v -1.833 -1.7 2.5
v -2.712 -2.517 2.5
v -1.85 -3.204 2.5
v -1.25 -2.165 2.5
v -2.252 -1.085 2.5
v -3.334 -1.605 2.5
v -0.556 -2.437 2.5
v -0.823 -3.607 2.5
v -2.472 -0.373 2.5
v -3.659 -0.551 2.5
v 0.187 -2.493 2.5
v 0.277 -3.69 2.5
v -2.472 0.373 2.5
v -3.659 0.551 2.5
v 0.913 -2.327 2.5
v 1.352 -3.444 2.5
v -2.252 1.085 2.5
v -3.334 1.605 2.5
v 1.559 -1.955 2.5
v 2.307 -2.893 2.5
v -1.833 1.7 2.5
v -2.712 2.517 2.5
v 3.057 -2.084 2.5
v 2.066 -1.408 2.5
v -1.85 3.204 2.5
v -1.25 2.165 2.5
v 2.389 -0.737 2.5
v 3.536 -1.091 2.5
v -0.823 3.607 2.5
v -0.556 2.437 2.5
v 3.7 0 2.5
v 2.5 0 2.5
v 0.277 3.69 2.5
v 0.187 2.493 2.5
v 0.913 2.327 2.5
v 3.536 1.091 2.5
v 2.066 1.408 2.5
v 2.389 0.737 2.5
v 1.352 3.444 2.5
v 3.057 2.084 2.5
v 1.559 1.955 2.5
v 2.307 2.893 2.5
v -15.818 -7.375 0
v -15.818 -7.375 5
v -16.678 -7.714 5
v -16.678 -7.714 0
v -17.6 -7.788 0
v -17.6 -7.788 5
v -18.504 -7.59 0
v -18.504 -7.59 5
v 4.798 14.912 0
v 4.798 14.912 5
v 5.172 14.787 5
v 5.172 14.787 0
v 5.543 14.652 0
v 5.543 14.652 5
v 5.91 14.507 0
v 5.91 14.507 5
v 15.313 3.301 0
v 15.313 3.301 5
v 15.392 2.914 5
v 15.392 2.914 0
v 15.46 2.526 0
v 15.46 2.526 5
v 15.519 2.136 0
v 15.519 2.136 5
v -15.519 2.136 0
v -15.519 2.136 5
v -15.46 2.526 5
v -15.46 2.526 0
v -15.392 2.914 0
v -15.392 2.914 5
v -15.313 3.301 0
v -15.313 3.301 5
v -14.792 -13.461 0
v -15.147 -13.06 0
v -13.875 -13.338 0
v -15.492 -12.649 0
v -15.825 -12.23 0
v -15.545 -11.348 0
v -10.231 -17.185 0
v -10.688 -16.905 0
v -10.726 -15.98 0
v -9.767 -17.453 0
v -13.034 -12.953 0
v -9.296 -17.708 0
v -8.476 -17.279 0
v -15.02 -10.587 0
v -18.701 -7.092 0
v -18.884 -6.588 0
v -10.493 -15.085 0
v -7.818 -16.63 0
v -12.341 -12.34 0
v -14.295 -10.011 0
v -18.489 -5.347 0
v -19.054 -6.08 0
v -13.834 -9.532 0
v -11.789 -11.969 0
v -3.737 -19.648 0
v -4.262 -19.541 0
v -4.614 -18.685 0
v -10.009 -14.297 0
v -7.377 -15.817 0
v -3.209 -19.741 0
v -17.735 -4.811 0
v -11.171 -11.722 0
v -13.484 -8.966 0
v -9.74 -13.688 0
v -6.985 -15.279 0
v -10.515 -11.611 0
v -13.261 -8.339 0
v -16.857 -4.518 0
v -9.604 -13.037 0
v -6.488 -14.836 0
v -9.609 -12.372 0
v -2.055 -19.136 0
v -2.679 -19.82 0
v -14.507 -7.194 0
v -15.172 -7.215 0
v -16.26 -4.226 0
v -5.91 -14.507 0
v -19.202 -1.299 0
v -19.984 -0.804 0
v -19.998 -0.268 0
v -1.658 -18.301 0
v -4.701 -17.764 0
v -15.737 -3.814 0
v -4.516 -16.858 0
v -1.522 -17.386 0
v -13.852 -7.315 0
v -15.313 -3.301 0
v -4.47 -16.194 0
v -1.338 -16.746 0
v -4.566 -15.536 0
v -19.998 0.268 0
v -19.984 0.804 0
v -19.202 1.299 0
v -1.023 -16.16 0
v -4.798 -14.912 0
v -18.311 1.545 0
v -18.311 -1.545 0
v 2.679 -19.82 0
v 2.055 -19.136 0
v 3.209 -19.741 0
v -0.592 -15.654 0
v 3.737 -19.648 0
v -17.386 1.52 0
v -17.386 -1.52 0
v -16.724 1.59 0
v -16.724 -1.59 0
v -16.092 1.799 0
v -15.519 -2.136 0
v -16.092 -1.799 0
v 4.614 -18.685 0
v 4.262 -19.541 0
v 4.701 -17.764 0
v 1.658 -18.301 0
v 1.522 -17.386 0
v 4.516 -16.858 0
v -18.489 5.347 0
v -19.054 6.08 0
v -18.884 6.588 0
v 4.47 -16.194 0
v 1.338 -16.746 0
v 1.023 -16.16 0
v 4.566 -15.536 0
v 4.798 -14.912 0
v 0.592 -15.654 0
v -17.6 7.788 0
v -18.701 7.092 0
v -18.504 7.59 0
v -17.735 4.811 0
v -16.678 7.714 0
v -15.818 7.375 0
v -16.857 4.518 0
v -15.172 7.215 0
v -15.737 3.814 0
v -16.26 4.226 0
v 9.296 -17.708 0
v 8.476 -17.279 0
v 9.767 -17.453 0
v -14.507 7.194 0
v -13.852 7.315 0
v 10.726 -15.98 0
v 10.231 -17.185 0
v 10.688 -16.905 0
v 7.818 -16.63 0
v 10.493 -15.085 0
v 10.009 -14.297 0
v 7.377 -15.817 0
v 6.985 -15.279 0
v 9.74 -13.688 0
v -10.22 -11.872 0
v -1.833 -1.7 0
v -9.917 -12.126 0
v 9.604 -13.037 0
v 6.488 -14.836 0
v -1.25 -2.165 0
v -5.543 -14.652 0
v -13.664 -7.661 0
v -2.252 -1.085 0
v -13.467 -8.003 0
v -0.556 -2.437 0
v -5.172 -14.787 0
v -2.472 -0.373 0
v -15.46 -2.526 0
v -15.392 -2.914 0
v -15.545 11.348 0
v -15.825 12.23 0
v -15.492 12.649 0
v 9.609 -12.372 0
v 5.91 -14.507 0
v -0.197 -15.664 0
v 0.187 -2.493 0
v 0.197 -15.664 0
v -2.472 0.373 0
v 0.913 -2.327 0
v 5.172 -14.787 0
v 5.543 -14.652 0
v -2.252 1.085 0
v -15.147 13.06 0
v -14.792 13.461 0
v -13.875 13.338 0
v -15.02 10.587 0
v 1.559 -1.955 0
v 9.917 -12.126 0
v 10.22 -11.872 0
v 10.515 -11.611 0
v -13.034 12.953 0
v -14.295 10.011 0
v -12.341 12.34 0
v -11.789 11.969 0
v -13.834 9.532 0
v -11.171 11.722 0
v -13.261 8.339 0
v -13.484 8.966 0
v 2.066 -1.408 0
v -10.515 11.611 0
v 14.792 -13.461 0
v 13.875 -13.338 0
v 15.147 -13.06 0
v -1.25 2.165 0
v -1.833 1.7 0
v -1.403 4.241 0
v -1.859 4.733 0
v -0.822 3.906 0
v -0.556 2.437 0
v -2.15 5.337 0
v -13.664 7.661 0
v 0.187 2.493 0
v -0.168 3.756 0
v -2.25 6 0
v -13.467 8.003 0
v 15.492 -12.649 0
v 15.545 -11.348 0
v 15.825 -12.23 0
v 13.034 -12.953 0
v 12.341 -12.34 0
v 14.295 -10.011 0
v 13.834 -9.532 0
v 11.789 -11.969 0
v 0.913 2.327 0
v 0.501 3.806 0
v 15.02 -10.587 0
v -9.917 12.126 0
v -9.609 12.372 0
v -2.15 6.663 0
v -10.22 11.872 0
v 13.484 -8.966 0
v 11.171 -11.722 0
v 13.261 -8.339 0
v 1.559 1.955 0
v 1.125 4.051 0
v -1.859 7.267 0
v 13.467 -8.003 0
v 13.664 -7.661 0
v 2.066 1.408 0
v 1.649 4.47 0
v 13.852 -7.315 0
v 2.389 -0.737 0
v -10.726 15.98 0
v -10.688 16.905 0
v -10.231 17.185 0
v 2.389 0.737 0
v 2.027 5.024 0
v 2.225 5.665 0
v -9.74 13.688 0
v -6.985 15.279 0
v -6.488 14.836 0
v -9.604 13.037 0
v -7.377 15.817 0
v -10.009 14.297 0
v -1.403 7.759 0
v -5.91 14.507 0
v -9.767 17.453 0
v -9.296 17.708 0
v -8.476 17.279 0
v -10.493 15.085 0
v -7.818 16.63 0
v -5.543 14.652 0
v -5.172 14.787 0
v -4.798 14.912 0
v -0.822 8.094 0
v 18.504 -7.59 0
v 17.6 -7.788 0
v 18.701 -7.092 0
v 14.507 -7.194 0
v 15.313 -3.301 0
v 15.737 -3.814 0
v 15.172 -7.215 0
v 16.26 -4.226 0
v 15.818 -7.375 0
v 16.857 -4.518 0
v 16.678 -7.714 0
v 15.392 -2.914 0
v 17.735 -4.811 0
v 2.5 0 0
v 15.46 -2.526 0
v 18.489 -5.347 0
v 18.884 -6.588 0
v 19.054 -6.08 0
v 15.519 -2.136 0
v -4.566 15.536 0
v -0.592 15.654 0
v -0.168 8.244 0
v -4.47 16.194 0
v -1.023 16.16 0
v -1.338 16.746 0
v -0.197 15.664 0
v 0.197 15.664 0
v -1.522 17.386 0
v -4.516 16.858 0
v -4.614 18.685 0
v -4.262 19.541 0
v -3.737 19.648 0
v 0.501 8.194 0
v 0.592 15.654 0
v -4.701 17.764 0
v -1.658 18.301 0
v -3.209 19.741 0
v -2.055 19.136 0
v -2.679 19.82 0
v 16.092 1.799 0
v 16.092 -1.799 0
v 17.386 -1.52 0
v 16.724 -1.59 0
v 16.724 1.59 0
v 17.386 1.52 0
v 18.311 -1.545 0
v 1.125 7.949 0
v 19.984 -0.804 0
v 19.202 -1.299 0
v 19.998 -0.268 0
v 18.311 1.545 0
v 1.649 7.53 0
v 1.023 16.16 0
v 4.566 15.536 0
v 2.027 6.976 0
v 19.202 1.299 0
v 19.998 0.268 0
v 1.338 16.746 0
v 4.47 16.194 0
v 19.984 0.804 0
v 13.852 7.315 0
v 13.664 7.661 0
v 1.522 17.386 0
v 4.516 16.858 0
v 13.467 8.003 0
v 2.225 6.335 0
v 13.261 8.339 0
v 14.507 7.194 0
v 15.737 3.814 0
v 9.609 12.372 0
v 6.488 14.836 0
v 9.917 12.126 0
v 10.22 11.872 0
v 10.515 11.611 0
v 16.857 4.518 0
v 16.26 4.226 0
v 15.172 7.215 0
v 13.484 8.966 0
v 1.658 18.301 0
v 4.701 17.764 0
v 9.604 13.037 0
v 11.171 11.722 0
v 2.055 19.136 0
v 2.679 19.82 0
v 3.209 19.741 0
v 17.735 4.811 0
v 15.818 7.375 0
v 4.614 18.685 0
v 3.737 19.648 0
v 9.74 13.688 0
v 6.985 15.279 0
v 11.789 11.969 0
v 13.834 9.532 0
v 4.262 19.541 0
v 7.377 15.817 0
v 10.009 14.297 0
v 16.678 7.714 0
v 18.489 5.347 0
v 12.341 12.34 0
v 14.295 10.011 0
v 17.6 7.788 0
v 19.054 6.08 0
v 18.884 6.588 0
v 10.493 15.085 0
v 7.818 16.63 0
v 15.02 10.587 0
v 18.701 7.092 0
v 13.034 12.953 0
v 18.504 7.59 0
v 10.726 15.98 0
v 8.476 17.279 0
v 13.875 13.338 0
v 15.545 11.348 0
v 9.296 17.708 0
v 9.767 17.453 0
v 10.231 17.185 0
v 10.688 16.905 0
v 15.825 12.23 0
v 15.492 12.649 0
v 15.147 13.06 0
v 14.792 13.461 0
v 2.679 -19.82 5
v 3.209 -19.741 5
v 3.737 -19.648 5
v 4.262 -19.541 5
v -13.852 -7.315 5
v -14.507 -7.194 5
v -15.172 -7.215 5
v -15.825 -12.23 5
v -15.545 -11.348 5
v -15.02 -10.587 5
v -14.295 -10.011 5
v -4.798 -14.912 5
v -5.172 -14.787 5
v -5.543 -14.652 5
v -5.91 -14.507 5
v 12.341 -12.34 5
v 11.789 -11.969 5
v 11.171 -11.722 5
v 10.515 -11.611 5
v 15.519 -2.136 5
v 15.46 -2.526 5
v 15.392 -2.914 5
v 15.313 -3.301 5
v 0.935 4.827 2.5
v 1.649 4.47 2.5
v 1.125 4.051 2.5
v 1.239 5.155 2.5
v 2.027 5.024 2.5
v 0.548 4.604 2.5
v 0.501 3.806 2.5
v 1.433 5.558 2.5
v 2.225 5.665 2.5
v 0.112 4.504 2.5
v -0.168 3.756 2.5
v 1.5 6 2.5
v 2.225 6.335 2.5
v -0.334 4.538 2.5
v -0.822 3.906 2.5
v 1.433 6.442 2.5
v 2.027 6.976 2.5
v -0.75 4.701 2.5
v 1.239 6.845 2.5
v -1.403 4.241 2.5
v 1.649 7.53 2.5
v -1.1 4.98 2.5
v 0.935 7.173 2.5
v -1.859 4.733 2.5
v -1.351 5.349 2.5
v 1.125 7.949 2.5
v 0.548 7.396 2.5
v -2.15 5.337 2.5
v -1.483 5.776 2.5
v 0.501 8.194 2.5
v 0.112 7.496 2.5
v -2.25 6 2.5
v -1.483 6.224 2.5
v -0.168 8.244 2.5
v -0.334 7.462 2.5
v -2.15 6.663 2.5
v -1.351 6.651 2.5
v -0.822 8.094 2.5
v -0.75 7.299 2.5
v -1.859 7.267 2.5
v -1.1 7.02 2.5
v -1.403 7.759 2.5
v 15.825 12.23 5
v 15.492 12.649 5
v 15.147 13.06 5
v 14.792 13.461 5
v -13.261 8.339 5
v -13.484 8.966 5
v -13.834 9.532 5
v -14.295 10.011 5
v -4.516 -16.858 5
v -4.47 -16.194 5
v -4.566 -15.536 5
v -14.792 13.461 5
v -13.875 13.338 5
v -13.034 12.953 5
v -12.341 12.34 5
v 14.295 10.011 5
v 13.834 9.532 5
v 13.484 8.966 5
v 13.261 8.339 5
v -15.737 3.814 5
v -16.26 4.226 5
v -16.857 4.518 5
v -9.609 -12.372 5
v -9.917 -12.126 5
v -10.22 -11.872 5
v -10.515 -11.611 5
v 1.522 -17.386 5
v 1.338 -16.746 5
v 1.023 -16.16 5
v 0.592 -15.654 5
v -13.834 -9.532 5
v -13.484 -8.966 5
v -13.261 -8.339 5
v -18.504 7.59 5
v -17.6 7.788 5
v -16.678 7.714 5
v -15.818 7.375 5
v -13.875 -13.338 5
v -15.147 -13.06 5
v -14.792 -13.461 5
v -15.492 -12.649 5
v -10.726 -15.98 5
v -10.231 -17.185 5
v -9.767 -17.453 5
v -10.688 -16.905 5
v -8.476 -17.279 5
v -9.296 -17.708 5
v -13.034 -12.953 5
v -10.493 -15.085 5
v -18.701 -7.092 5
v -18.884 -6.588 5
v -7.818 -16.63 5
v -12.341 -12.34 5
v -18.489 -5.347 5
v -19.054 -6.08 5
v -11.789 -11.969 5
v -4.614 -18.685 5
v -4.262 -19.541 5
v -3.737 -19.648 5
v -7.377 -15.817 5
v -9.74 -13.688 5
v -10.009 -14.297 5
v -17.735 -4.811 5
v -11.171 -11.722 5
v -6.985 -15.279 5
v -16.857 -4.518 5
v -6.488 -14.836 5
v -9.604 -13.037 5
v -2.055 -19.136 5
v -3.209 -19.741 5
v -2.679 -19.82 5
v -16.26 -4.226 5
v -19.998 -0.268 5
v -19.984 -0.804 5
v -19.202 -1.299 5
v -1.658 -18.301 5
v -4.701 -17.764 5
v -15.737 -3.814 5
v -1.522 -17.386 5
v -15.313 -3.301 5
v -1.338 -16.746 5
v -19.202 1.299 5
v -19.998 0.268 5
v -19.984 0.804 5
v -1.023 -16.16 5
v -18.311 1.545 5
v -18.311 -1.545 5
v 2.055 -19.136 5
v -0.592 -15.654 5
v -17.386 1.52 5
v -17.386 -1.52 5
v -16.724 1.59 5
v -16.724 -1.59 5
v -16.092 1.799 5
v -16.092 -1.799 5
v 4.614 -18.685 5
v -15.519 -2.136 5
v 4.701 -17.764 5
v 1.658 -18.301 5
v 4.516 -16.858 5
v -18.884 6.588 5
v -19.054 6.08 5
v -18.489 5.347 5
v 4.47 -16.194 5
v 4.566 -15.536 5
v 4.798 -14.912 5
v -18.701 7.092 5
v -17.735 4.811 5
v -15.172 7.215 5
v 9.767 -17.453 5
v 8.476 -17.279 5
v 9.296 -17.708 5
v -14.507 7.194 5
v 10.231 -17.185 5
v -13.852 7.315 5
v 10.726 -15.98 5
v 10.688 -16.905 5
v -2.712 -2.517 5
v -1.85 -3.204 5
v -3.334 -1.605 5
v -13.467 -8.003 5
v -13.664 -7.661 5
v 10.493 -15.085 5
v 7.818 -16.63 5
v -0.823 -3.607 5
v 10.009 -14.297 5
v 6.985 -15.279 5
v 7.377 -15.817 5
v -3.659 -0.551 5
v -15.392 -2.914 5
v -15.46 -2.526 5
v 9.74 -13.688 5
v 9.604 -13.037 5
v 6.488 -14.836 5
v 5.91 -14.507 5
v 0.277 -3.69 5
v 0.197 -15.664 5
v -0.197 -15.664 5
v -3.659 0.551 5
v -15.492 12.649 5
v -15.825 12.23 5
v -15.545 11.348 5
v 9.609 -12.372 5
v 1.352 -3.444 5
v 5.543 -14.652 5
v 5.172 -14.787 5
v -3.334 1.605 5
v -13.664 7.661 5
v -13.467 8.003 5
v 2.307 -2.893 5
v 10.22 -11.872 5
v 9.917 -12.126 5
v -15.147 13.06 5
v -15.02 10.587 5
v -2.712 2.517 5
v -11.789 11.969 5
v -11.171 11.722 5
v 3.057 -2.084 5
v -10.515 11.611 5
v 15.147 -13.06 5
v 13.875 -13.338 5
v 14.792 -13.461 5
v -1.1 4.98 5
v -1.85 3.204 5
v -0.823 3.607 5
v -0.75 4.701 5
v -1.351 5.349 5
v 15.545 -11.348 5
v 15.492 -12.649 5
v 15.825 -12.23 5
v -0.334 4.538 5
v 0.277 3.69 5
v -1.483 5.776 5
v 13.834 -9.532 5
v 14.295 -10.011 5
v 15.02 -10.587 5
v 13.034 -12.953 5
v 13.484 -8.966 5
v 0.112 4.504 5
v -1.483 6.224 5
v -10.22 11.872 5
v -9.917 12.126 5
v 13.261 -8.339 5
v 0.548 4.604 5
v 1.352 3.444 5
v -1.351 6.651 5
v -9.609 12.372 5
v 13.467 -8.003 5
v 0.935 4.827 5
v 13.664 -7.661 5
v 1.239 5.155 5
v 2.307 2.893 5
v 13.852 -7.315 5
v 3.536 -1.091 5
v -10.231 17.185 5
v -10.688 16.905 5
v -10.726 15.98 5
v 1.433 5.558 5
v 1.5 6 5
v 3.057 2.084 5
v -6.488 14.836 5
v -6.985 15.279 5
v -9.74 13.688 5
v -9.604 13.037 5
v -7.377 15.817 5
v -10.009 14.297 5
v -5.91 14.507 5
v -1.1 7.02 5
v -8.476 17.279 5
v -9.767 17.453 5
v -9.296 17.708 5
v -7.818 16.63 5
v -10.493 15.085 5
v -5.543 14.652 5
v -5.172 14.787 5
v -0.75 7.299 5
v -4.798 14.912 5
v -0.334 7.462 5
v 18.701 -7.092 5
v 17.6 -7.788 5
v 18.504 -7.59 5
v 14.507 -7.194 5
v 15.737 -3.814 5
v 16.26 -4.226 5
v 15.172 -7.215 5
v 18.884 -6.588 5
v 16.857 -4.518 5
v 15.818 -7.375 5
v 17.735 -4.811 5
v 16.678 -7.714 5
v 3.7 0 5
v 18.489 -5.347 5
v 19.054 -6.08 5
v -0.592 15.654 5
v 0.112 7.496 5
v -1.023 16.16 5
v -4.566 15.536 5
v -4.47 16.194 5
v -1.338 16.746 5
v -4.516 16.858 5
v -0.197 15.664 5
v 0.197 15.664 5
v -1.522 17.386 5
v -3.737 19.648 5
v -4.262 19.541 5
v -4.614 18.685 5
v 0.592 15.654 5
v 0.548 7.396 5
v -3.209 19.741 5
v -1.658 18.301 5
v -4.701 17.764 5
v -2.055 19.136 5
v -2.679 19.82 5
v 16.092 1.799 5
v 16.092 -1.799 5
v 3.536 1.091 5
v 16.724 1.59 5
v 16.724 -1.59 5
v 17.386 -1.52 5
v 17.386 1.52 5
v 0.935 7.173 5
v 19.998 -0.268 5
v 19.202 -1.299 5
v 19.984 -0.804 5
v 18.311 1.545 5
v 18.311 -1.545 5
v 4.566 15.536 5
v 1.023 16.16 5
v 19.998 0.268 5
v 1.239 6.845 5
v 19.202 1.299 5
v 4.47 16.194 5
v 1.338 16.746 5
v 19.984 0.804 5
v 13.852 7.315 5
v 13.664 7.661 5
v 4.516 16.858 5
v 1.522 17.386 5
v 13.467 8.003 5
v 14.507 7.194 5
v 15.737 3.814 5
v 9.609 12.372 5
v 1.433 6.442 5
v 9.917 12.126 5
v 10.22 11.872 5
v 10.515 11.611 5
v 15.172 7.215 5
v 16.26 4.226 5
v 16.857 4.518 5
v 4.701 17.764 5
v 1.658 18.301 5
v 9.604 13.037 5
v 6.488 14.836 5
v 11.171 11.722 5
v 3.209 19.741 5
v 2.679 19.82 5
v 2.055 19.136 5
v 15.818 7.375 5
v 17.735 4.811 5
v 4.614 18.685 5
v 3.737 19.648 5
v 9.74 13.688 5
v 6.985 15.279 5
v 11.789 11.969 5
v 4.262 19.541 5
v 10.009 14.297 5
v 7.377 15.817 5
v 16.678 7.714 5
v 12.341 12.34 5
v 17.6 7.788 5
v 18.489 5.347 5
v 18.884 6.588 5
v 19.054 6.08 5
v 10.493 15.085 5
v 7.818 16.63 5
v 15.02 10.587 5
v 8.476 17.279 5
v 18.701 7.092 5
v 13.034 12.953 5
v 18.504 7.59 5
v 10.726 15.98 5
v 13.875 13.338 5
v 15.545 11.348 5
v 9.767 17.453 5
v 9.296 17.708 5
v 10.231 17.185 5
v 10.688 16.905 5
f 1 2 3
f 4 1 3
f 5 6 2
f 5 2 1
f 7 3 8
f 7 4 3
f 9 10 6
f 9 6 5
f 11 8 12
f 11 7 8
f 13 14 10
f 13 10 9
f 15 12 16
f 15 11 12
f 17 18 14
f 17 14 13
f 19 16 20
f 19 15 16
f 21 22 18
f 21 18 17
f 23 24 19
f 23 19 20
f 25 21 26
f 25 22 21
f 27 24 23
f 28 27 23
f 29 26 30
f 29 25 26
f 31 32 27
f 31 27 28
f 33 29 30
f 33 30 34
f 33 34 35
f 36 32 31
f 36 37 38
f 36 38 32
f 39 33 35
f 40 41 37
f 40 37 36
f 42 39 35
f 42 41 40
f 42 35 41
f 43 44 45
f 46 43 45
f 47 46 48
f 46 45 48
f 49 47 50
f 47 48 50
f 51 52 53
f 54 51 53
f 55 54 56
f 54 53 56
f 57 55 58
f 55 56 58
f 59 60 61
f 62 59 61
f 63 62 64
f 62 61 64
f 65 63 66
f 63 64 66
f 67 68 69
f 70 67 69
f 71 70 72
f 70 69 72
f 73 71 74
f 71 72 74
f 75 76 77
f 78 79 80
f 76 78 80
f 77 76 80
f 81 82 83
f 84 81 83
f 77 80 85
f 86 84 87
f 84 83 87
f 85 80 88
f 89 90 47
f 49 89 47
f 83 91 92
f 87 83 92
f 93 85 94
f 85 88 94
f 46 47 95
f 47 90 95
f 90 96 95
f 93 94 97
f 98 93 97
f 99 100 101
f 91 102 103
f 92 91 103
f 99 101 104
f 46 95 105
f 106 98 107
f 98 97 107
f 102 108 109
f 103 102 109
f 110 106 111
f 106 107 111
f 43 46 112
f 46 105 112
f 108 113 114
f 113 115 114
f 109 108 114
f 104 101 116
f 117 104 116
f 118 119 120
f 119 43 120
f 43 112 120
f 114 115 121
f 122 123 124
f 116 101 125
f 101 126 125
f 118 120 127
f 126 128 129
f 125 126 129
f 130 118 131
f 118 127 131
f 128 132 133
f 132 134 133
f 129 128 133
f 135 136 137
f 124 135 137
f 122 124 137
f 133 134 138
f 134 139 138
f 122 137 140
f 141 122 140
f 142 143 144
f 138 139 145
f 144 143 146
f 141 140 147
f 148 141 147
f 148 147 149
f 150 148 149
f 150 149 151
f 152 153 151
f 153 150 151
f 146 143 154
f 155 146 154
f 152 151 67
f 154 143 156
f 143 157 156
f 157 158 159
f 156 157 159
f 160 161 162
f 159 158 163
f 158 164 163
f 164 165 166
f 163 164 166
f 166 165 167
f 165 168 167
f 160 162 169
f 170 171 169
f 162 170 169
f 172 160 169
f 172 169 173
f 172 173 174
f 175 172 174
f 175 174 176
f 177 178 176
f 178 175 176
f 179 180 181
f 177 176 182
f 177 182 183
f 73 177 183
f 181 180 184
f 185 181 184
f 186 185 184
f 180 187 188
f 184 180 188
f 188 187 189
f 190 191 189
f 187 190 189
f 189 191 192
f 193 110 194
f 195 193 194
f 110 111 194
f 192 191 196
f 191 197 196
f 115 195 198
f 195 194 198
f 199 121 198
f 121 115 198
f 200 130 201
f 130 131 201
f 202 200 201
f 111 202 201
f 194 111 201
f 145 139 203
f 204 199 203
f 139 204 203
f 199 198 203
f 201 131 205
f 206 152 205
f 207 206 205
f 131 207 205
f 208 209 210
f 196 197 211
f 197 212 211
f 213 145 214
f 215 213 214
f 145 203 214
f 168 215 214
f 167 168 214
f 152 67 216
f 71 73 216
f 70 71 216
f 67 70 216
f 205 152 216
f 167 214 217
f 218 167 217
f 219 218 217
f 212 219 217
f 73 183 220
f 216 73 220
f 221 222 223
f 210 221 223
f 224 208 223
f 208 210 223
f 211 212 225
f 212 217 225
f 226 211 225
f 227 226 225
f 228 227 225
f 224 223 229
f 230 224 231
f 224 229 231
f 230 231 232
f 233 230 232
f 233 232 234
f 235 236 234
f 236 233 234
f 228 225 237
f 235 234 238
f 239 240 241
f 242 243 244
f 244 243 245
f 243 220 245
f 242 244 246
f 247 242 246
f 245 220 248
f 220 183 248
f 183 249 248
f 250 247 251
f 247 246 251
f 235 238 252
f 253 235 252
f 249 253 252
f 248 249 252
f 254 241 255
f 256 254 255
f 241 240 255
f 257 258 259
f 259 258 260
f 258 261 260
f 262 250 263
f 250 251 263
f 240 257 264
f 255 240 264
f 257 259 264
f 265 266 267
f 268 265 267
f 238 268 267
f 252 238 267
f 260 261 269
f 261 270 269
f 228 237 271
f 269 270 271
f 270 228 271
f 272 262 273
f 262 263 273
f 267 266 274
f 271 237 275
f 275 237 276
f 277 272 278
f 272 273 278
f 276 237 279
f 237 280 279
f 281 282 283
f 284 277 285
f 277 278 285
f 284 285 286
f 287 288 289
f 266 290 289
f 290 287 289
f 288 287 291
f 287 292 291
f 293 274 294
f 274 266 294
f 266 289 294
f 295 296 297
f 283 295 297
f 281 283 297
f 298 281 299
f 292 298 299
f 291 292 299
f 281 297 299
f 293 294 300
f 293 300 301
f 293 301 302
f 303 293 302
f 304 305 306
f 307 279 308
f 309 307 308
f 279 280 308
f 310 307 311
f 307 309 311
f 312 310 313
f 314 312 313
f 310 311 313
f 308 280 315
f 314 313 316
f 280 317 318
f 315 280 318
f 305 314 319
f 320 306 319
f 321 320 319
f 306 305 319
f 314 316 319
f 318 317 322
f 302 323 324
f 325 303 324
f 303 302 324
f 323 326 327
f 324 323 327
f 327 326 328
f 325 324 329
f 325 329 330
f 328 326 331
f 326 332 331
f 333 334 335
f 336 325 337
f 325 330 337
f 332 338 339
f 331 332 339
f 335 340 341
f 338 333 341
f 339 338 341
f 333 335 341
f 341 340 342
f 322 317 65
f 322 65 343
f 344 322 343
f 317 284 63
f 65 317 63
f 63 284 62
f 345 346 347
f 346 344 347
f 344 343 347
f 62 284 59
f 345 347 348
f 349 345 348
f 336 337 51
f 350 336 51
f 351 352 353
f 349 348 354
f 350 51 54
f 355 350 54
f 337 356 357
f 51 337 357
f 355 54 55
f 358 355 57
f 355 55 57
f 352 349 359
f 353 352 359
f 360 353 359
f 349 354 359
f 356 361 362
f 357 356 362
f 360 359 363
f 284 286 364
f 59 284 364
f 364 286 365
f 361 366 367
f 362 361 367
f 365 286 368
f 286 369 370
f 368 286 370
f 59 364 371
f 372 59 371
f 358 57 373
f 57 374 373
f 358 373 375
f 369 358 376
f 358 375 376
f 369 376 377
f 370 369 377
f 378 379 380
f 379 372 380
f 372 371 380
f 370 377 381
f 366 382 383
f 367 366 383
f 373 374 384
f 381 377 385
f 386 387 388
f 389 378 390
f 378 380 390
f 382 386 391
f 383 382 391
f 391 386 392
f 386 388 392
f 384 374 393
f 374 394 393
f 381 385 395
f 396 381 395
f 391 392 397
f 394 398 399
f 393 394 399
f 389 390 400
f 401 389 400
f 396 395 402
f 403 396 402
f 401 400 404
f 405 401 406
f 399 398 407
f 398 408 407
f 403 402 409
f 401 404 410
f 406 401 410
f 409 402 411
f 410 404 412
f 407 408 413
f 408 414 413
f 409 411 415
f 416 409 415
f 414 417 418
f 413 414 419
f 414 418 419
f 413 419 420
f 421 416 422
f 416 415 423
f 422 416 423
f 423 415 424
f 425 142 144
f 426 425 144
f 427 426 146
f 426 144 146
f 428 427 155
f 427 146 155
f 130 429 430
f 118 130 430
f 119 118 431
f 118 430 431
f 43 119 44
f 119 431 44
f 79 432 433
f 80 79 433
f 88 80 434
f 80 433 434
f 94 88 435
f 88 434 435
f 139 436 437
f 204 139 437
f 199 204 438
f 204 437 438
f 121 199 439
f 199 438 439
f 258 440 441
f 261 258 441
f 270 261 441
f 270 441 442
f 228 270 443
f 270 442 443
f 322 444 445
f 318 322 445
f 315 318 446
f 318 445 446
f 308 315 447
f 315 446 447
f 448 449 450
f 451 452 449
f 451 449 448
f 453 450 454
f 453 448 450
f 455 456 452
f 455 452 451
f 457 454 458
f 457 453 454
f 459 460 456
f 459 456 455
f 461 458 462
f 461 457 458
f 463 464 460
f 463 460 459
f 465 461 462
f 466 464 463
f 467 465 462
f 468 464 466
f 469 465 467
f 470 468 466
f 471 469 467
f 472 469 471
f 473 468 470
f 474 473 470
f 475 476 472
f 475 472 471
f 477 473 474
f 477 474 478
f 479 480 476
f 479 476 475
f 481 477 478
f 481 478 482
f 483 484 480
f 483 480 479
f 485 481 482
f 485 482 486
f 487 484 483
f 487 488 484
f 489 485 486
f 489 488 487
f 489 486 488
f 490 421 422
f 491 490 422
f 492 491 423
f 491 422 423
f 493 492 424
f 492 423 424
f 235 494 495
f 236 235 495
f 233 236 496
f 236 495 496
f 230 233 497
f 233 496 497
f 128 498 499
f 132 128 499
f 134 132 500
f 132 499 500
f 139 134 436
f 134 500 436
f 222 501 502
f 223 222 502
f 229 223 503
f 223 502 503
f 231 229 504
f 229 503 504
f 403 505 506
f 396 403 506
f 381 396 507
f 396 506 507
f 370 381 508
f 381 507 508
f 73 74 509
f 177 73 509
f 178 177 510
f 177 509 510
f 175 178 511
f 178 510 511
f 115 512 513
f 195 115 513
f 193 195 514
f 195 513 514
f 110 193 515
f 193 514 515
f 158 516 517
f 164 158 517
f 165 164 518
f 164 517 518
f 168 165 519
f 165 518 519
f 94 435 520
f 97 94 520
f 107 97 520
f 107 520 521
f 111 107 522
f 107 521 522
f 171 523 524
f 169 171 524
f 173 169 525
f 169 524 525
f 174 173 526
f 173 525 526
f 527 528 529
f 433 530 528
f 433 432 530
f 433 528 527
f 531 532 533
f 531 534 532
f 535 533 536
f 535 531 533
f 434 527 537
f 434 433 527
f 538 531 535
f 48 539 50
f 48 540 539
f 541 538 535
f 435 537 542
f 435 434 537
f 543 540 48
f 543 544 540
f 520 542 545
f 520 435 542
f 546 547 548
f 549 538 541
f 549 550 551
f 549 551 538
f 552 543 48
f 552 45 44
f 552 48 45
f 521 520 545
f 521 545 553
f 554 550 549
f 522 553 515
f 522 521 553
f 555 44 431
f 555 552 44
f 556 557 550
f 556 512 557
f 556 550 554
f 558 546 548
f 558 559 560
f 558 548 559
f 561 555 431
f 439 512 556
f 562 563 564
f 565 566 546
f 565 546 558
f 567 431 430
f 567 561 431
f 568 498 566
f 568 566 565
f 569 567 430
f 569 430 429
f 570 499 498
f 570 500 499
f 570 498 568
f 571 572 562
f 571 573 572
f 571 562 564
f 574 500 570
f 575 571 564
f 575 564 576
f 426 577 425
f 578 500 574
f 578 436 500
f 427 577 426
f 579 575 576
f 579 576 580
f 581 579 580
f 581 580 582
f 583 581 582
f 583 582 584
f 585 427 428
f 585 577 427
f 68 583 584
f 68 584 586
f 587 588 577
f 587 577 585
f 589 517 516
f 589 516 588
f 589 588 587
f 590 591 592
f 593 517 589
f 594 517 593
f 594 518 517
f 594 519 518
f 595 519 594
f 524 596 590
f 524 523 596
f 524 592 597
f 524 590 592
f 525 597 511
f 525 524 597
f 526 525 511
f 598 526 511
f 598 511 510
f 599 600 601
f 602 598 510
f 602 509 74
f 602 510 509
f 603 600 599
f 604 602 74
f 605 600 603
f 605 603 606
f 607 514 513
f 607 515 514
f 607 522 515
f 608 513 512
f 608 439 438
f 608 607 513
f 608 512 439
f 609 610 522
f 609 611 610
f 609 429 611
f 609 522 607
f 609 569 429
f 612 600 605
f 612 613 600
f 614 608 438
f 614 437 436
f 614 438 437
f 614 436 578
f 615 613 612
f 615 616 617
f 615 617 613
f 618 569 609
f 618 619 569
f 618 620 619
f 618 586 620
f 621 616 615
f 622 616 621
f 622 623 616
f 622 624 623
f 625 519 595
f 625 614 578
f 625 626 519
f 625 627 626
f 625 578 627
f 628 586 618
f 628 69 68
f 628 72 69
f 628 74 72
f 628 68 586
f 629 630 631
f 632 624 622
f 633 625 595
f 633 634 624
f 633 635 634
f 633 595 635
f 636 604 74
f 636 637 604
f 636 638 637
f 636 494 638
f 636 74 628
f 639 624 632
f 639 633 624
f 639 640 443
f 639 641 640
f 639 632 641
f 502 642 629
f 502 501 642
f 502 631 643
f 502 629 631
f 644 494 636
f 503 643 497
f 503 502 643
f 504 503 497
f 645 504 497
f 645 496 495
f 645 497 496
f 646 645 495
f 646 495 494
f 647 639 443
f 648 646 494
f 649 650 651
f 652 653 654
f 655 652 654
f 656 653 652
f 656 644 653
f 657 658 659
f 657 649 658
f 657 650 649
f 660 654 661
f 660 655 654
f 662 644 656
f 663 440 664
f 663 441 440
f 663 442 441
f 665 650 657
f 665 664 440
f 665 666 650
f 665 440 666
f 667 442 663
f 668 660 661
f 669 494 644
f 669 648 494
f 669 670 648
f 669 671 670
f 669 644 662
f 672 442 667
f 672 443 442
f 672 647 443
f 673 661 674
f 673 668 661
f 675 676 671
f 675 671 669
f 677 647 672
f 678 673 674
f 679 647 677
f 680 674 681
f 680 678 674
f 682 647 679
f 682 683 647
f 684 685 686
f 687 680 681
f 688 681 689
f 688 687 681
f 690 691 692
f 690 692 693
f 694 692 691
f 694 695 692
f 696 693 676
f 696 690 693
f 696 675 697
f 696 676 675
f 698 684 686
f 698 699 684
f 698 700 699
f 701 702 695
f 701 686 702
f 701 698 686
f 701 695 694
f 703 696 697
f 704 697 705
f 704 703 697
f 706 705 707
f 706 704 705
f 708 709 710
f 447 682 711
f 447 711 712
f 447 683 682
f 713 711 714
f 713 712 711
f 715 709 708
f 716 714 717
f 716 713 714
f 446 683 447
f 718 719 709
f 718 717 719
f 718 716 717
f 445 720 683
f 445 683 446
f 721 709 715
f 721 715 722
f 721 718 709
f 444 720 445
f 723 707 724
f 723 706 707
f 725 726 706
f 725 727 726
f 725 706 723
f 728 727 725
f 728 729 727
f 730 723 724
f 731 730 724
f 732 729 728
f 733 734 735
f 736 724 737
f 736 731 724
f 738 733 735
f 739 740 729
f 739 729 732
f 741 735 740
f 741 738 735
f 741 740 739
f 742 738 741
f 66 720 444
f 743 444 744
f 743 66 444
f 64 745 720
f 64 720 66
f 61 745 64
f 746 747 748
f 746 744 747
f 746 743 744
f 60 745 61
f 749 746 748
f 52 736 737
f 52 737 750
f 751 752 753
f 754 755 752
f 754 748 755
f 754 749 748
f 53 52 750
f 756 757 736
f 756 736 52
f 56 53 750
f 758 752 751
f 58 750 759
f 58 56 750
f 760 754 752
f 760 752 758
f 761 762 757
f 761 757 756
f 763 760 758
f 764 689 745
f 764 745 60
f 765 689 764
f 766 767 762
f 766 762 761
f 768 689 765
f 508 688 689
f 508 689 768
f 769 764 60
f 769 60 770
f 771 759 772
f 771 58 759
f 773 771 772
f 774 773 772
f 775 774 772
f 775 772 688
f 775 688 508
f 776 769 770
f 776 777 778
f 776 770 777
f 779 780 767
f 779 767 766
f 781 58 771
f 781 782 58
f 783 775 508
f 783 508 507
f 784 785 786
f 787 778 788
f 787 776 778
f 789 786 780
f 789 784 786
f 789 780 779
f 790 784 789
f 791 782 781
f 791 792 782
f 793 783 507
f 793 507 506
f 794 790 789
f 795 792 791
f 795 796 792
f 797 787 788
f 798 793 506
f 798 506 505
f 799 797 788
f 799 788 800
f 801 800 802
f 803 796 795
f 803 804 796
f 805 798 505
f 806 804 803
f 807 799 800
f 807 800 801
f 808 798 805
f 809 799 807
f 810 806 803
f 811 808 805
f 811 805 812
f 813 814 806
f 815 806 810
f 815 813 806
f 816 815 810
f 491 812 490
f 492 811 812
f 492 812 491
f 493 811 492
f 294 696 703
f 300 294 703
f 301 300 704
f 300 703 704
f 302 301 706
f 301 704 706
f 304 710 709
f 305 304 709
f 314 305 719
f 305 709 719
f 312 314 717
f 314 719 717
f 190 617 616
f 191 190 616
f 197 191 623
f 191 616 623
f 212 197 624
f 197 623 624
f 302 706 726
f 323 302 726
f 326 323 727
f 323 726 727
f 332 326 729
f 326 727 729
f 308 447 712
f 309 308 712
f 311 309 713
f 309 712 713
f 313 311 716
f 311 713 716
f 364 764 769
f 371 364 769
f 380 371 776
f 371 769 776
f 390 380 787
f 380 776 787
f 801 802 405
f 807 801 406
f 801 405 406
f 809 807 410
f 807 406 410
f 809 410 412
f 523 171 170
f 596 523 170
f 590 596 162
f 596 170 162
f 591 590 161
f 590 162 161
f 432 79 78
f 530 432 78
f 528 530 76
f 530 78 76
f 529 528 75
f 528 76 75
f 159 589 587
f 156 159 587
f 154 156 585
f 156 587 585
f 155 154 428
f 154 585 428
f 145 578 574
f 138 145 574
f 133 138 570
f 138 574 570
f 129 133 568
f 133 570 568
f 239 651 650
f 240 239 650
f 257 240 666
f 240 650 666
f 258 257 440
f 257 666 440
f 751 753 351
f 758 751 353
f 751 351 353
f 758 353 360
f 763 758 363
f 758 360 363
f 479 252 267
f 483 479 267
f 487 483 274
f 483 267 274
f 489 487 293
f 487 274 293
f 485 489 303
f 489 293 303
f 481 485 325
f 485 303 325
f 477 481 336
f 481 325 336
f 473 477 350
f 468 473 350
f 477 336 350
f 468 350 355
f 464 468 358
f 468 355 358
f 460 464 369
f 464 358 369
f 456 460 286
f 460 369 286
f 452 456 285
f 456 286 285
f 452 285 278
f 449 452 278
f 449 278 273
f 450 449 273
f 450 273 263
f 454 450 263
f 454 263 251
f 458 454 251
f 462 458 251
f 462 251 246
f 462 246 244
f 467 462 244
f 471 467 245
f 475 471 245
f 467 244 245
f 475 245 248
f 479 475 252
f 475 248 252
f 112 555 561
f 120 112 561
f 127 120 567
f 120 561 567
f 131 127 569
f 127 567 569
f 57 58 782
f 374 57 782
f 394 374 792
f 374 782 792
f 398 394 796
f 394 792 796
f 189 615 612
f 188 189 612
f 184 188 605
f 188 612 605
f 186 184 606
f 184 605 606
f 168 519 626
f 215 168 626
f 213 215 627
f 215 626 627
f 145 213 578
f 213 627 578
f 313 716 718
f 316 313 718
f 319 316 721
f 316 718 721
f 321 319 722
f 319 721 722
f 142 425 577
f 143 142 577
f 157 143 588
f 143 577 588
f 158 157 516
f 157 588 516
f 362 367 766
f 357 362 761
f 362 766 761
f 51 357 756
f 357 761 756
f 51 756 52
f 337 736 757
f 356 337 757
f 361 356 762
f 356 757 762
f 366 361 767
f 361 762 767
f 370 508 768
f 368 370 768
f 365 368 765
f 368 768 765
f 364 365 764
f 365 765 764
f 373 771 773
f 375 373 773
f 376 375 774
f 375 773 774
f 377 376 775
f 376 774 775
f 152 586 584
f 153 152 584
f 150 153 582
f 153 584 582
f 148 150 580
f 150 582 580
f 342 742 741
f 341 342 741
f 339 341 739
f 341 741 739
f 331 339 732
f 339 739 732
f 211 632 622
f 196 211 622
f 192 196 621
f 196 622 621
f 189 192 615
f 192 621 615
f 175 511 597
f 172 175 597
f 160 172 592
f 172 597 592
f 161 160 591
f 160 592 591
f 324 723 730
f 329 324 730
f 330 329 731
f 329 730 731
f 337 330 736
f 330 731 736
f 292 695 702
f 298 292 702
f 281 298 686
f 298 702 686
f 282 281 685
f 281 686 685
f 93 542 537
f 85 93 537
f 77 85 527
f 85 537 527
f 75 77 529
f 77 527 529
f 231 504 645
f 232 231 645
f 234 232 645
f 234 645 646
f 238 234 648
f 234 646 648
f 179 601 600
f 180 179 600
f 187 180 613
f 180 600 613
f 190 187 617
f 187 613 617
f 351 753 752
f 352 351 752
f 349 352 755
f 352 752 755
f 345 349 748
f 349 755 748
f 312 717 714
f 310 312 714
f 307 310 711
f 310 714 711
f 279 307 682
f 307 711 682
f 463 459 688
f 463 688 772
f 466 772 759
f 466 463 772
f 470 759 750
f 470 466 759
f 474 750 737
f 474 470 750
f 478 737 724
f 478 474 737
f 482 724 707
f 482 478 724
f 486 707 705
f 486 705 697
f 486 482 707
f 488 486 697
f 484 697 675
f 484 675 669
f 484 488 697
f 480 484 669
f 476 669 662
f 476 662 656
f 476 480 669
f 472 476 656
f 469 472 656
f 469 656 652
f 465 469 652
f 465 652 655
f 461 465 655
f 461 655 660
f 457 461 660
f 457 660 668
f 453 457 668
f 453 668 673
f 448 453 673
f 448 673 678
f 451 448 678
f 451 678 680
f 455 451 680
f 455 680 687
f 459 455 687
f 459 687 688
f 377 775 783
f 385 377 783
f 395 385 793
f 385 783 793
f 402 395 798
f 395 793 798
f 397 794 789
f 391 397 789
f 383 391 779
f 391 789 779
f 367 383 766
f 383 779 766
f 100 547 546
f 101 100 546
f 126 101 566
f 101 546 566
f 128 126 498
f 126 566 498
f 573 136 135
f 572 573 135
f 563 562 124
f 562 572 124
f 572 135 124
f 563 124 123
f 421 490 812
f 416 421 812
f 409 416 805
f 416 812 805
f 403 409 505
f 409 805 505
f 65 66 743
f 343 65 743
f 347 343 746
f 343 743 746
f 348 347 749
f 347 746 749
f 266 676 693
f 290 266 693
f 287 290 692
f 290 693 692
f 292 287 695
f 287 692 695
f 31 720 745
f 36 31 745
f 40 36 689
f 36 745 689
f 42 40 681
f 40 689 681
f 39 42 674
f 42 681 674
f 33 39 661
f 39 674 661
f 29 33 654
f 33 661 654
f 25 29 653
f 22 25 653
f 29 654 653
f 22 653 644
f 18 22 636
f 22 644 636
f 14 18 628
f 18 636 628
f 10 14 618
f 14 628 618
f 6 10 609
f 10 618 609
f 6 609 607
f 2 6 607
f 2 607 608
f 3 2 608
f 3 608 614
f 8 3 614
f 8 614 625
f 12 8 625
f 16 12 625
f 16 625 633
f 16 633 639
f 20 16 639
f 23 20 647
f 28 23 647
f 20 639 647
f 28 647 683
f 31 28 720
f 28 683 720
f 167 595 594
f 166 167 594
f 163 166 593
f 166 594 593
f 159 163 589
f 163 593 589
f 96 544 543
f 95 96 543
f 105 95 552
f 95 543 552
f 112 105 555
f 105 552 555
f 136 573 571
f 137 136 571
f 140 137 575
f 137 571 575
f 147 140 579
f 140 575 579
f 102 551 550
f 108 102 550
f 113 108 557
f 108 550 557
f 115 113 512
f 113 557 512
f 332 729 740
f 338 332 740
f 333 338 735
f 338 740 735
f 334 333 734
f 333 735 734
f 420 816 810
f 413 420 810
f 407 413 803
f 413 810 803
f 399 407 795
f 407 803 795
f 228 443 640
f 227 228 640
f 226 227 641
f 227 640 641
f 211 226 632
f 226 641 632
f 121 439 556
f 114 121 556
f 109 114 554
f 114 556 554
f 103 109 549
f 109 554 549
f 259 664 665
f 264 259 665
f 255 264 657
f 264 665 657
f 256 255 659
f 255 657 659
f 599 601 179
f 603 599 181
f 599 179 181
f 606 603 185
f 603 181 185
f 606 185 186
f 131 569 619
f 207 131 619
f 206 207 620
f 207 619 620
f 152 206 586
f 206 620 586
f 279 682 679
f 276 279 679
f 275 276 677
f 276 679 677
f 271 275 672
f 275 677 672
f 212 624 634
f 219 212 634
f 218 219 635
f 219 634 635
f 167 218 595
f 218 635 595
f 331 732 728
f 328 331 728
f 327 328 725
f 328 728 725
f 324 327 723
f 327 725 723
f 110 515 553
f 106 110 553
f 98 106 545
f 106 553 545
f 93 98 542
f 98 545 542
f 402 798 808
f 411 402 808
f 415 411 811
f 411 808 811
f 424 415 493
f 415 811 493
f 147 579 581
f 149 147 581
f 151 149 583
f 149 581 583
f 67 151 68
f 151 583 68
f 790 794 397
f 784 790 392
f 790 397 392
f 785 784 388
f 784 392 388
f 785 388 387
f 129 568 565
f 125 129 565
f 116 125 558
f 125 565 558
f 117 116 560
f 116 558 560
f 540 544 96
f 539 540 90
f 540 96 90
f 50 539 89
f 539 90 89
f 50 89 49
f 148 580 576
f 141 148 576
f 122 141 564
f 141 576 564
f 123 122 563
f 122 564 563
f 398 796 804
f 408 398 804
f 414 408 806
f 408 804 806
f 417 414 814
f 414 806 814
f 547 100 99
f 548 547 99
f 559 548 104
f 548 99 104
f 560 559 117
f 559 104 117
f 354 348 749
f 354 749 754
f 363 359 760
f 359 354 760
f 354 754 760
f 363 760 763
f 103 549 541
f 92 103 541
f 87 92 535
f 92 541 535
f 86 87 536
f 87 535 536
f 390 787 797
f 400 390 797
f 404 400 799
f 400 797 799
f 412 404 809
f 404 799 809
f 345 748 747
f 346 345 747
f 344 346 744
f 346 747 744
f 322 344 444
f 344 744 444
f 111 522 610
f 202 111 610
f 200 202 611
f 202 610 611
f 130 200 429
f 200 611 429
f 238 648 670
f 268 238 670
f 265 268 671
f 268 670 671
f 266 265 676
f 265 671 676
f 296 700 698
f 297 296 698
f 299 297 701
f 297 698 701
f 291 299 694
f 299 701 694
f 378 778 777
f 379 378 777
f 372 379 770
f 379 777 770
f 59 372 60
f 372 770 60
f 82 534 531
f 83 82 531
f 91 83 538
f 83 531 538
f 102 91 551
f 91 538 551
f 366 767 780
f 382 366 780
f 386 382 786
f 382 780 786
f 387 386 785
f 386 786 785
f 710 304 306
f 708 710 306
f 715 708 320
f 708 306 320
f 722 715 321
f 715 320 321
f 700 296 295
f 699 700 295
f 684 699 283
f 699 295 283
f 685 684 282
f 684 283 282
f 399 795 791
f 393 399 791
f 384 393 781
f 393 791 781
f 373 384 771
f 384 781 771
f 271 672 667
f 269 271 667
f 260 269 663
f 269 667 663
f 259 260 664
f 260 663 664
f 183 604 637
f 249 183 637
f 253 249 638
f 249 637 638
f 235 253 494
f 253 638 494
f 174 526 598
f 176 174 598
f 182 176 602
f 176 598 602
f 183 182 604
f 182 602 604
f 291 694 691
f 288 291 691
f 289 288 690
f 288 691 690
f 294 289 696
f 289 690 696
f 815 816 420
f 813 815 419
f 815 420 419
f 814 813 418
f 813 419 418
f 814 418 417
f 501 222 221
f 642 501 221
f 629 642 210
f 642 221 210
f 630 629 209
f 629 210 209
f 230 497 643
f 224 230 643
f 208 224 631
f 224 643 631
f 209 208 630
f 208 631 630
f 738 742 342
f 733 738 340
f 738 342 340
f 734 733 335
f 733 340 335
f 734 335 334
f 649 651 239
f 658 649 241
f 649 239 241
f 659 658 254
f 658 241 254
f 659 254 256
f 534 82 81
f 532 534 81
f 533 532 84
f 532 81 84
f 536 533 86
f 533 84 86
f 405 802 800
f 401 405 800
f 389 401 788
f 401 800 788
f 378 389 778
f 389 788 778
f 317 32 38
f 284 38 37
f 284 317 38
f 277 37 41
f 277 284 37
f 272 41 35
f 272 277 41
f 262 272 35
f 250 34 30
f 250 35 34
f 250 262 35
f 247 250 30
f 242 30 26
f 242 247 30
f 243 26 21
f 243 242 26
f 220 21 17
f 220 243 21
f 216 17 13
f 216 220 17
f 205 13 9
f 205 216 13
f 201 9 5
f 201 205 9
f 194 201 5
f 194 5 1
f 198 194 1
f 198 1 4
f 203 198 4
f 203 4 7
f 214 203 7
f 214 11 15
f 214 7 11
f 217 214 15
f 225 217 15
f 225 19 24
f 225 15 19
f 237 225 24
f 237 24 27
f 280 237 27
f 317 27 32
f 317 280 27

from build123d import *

# Parameters (mm, degrees)
CROQUIS1_R              = 20
CROQUIS1_R_2            = 2.5
CROQUIS1_R_3            = 1.5
SALIENTE_EXTRUIR1_DEPTH = 5
CORTAR_EXTRUIR1_DEPTH   = 29.722813233
MATRIZC1_COUNT          = 18
CROQUIS3_R              = 3.7
CORTAR_EXTRUIR2_DEPTH   = 2.5
CROQUIS4_R              = 2.25
CORTAR_EXTRUIR3_DEPTH   = 2.5


with BuildPart() as part:
    # Croquis1 → Saliente-Extruir1 (new body)
    with BuildSketch(Plane.XY):
        Circle(CROQUIS1_R)
        Circle(CROQUIS1_R_2, mode=Mode.SUBTRACT)
        with Locations((0, 6)):
            Circle(CROQUIS1_R_3, mode=Mode.SUBTRACT)
    extrude(amount=SALIENTE_EXTRUIR1_DEPTH)

    # Croquis2 → Cortar-Extruir1 (cut, through all)
    with BuildSketch(Plane.XY.offset(5)):
        with BuildLine():
            ThreePointArc((2.678584333, 19.819818011), (0, 20), (-2.678584333, 19.819818011))
            ThreePointArc((-2.678584333, 19.819818011), (-1.82600889, 18.733131722), (-1.522223543, 17.385731841))
            ThreePointArc((-1.522223543, 17.385731841), (-1.19593308, 16.445057276), (-0.5915417, 15.653827117))
            ThreePointArc((-0.5915417, 15.653827117), (0, 15.665), (0.5915417, 15.653827117))
            ThreePointArc((0.5915417, 15.653827117), (1.19593308, 16.445057276), (1.522223543, 17.385731841))
            ThreePointArc((1.522223543, 17.385731841), (1.82600889, 18.733131722), (2.678584333, 19.819818011))
        make_face()
    cortar_extruir1 = extrude(amount=-CORTAR_EXTRUIR1_DEPTH, mode=Mode.SUBTRACT)

    # MatrizC1: Cortar-Extruir1 ×18 about axis
    matrizc1_axis = Axis((0, 0, 0), (0, 0, 1))
    for i in range(1, MATRIZC1_COUNT):
        add(cortar_extruir1.rotate(matrizc1_axis, i * 360 / MATRIZC1_COUNT), mode=Mode.SUBTRACT)

    # Croquis3 → Cortar-Extruir2 (cut)
    with BuildSketch(Plane.XY.offset(5)):
        Circle(CROQUIS3_R)
    extrude(amount=-CORTAR_EXTRUIR2_DEPTH, mode=Mode.SUBTRACT)

    # Croquis4 → Cortar-Extruir3 (cut)
    with BuildSketch(Plane(origin=(0, 0, 0), x_dir=(-1, 0, 0), z_dir=(0, 0, -1))):
        with Locations((0, 6)):
            Circle(CROQUIS4_R)
    extrude(amount=-CORTAR_EXTRUIR3_DEPTH, mode=Mode.SUBTRACT)


solid = part.part
